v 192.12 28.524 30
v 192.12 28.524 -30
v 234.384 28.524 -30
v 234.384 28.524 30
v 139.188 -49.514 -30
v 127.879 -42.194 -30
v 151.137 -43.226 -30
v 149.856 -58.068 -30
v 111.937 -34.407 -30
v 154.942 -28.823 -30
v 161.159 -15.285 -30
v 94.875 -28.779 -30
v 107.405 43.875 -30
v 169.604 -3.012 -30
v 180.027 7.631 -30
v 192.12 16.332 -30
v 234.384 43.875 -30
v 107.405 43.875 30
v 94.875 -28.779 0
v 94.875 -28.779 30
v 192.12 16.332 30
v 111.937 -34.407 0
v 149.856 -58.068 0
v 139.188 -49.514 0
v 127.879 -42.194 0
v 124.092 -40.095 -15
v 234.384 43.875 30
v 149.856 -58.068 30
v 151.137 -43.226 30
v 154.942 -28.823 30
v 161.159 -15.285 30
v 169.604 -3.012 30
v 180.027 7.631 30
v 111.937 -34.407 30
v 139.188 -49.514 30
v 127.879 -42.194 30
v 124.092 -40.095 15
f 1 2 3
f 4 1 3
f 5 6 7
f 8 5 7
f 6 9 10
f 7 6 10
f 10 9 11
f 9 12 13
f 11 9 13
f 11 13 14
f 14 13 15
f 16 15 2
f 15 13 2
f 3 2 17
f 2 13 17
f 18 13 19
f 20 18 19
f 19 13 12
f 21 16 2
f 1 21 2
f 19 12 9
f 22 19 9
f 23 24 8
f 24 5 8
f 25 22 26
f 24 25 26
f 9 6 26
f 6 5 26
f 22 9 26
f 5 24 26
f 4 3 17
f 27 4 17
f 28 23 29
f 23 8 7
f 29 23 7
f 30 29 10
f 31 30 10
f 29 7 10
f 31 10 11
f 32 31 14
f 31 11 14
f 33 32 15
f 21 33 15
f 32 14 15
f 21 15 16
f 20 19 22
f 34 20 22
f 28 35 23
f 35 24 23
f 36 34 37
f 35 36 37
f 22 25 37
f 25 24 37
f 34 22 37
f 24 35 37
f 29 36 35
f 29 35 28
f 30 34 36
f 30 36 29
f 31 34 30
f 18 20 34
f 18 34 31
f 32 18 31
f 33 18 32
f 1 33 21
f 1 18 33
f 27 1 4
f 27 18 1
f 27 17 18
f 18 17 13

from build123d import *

# Parameters (mm, degrees)
RIGHTM_DEPTH = 30
LEFTM_START  = -30
LEFTM_DEPTH  = 30


with BuildPart() as part:
    # Sketch1 → rightM (new body)
    with BuildSketch(Plane.XY):
        Polygon((149.855864514, 43.874842), (149.855864514, 28.52351163), (192.119809278, 28.52351163), (234.383754043, 28.52351163), (234.383754043, 43.874842), (192.853964769, 43.874842), align=None)
        with BuildLine():
            Line((149.855864514, 28.52351163), (149.855864514, -58.067716007))
            ThreePointArc((149.855864514, -58.067716007), (156.250771623, -25.404082318), (174.491218383, 2.436426025))
            ThreePointArc((174.491218383, 2.436426025), (182.853494659, 9.95749243), (192.119809278, 16.331621214))
            Line((192.119809278, 16.331621214), (192.119809278, 28.52351163))
            Line((192.119809278, 28.52351163), (149.855864514, 28.52351163))
        make_face()
        with BuildLine():
            Line((107.405043491, 43.874842), (94.874715104, -28.778692489))
            add(Edge.make_bspline(
                [(94.874715104, -28.778692489), (125.81929731, -36.765852729), (149.855864514, -58.067716007)],
                knots=[0, 0, 0, 1, 1, 1], degree=2))
            Line((149.855864514, -58.067716007), (149.855864514, 43.874842))
            Line((149.855864514, 43.874842), (107.405043491, 43.874842))
        make_face()
    extrude(amount=RIGHTM_DEPTH)

    # Sketch2 → leftM (add)
    with BuildSketch(Plane.XY.offset(LEFTM_START)):
        Polygon((149.855864514, 43.874842), (149.855864514, 28.52351163), (192.119809278, 28.52351163), (234.383754043, 28.52351163), (234.383754043, 43.874842), (192.853964769, 43.874842), align=None)
        with BuildLine():
            Line((107.405043491, 43.874842), (94.874715104, -28.778692489))
            add(Edge.make_bspline(
                [(94.874715104, -28.778692489), (125.81929731, -36.765852729), (149.855864514, -58.067716007)],
                knots=[0, 0, 0, 1, 1, 1], degree=2))
            Line((149.855864514, -58.067716007), (149.855864514, 43.874842))
            Line((149.855864514, 43.874842), (107.405043491, 43.874842))
        make_face()
        with BuildLine():
            Line((149.855864514, 28.52351163), (149.855864514, -58.067716007))
            ThreePointArc((149.855864514, -58.067716007), (156.250771623, -25.404082318), (174.491218383, 2.436426025))
            ThreePointArc((174.491218383, 2.436426025), (182.853494659, 9.95749243), (192.119809278, 16.331621214))
            Line((192.119809278, 16.331621214), (192.119809278, 28.52351163))
            Line((192.119809278, 28.52351163), (149.855864514, 28.52351163))
        make_face()
    extrude(amount=LEFTM_DEPTH)


solid = part.part
